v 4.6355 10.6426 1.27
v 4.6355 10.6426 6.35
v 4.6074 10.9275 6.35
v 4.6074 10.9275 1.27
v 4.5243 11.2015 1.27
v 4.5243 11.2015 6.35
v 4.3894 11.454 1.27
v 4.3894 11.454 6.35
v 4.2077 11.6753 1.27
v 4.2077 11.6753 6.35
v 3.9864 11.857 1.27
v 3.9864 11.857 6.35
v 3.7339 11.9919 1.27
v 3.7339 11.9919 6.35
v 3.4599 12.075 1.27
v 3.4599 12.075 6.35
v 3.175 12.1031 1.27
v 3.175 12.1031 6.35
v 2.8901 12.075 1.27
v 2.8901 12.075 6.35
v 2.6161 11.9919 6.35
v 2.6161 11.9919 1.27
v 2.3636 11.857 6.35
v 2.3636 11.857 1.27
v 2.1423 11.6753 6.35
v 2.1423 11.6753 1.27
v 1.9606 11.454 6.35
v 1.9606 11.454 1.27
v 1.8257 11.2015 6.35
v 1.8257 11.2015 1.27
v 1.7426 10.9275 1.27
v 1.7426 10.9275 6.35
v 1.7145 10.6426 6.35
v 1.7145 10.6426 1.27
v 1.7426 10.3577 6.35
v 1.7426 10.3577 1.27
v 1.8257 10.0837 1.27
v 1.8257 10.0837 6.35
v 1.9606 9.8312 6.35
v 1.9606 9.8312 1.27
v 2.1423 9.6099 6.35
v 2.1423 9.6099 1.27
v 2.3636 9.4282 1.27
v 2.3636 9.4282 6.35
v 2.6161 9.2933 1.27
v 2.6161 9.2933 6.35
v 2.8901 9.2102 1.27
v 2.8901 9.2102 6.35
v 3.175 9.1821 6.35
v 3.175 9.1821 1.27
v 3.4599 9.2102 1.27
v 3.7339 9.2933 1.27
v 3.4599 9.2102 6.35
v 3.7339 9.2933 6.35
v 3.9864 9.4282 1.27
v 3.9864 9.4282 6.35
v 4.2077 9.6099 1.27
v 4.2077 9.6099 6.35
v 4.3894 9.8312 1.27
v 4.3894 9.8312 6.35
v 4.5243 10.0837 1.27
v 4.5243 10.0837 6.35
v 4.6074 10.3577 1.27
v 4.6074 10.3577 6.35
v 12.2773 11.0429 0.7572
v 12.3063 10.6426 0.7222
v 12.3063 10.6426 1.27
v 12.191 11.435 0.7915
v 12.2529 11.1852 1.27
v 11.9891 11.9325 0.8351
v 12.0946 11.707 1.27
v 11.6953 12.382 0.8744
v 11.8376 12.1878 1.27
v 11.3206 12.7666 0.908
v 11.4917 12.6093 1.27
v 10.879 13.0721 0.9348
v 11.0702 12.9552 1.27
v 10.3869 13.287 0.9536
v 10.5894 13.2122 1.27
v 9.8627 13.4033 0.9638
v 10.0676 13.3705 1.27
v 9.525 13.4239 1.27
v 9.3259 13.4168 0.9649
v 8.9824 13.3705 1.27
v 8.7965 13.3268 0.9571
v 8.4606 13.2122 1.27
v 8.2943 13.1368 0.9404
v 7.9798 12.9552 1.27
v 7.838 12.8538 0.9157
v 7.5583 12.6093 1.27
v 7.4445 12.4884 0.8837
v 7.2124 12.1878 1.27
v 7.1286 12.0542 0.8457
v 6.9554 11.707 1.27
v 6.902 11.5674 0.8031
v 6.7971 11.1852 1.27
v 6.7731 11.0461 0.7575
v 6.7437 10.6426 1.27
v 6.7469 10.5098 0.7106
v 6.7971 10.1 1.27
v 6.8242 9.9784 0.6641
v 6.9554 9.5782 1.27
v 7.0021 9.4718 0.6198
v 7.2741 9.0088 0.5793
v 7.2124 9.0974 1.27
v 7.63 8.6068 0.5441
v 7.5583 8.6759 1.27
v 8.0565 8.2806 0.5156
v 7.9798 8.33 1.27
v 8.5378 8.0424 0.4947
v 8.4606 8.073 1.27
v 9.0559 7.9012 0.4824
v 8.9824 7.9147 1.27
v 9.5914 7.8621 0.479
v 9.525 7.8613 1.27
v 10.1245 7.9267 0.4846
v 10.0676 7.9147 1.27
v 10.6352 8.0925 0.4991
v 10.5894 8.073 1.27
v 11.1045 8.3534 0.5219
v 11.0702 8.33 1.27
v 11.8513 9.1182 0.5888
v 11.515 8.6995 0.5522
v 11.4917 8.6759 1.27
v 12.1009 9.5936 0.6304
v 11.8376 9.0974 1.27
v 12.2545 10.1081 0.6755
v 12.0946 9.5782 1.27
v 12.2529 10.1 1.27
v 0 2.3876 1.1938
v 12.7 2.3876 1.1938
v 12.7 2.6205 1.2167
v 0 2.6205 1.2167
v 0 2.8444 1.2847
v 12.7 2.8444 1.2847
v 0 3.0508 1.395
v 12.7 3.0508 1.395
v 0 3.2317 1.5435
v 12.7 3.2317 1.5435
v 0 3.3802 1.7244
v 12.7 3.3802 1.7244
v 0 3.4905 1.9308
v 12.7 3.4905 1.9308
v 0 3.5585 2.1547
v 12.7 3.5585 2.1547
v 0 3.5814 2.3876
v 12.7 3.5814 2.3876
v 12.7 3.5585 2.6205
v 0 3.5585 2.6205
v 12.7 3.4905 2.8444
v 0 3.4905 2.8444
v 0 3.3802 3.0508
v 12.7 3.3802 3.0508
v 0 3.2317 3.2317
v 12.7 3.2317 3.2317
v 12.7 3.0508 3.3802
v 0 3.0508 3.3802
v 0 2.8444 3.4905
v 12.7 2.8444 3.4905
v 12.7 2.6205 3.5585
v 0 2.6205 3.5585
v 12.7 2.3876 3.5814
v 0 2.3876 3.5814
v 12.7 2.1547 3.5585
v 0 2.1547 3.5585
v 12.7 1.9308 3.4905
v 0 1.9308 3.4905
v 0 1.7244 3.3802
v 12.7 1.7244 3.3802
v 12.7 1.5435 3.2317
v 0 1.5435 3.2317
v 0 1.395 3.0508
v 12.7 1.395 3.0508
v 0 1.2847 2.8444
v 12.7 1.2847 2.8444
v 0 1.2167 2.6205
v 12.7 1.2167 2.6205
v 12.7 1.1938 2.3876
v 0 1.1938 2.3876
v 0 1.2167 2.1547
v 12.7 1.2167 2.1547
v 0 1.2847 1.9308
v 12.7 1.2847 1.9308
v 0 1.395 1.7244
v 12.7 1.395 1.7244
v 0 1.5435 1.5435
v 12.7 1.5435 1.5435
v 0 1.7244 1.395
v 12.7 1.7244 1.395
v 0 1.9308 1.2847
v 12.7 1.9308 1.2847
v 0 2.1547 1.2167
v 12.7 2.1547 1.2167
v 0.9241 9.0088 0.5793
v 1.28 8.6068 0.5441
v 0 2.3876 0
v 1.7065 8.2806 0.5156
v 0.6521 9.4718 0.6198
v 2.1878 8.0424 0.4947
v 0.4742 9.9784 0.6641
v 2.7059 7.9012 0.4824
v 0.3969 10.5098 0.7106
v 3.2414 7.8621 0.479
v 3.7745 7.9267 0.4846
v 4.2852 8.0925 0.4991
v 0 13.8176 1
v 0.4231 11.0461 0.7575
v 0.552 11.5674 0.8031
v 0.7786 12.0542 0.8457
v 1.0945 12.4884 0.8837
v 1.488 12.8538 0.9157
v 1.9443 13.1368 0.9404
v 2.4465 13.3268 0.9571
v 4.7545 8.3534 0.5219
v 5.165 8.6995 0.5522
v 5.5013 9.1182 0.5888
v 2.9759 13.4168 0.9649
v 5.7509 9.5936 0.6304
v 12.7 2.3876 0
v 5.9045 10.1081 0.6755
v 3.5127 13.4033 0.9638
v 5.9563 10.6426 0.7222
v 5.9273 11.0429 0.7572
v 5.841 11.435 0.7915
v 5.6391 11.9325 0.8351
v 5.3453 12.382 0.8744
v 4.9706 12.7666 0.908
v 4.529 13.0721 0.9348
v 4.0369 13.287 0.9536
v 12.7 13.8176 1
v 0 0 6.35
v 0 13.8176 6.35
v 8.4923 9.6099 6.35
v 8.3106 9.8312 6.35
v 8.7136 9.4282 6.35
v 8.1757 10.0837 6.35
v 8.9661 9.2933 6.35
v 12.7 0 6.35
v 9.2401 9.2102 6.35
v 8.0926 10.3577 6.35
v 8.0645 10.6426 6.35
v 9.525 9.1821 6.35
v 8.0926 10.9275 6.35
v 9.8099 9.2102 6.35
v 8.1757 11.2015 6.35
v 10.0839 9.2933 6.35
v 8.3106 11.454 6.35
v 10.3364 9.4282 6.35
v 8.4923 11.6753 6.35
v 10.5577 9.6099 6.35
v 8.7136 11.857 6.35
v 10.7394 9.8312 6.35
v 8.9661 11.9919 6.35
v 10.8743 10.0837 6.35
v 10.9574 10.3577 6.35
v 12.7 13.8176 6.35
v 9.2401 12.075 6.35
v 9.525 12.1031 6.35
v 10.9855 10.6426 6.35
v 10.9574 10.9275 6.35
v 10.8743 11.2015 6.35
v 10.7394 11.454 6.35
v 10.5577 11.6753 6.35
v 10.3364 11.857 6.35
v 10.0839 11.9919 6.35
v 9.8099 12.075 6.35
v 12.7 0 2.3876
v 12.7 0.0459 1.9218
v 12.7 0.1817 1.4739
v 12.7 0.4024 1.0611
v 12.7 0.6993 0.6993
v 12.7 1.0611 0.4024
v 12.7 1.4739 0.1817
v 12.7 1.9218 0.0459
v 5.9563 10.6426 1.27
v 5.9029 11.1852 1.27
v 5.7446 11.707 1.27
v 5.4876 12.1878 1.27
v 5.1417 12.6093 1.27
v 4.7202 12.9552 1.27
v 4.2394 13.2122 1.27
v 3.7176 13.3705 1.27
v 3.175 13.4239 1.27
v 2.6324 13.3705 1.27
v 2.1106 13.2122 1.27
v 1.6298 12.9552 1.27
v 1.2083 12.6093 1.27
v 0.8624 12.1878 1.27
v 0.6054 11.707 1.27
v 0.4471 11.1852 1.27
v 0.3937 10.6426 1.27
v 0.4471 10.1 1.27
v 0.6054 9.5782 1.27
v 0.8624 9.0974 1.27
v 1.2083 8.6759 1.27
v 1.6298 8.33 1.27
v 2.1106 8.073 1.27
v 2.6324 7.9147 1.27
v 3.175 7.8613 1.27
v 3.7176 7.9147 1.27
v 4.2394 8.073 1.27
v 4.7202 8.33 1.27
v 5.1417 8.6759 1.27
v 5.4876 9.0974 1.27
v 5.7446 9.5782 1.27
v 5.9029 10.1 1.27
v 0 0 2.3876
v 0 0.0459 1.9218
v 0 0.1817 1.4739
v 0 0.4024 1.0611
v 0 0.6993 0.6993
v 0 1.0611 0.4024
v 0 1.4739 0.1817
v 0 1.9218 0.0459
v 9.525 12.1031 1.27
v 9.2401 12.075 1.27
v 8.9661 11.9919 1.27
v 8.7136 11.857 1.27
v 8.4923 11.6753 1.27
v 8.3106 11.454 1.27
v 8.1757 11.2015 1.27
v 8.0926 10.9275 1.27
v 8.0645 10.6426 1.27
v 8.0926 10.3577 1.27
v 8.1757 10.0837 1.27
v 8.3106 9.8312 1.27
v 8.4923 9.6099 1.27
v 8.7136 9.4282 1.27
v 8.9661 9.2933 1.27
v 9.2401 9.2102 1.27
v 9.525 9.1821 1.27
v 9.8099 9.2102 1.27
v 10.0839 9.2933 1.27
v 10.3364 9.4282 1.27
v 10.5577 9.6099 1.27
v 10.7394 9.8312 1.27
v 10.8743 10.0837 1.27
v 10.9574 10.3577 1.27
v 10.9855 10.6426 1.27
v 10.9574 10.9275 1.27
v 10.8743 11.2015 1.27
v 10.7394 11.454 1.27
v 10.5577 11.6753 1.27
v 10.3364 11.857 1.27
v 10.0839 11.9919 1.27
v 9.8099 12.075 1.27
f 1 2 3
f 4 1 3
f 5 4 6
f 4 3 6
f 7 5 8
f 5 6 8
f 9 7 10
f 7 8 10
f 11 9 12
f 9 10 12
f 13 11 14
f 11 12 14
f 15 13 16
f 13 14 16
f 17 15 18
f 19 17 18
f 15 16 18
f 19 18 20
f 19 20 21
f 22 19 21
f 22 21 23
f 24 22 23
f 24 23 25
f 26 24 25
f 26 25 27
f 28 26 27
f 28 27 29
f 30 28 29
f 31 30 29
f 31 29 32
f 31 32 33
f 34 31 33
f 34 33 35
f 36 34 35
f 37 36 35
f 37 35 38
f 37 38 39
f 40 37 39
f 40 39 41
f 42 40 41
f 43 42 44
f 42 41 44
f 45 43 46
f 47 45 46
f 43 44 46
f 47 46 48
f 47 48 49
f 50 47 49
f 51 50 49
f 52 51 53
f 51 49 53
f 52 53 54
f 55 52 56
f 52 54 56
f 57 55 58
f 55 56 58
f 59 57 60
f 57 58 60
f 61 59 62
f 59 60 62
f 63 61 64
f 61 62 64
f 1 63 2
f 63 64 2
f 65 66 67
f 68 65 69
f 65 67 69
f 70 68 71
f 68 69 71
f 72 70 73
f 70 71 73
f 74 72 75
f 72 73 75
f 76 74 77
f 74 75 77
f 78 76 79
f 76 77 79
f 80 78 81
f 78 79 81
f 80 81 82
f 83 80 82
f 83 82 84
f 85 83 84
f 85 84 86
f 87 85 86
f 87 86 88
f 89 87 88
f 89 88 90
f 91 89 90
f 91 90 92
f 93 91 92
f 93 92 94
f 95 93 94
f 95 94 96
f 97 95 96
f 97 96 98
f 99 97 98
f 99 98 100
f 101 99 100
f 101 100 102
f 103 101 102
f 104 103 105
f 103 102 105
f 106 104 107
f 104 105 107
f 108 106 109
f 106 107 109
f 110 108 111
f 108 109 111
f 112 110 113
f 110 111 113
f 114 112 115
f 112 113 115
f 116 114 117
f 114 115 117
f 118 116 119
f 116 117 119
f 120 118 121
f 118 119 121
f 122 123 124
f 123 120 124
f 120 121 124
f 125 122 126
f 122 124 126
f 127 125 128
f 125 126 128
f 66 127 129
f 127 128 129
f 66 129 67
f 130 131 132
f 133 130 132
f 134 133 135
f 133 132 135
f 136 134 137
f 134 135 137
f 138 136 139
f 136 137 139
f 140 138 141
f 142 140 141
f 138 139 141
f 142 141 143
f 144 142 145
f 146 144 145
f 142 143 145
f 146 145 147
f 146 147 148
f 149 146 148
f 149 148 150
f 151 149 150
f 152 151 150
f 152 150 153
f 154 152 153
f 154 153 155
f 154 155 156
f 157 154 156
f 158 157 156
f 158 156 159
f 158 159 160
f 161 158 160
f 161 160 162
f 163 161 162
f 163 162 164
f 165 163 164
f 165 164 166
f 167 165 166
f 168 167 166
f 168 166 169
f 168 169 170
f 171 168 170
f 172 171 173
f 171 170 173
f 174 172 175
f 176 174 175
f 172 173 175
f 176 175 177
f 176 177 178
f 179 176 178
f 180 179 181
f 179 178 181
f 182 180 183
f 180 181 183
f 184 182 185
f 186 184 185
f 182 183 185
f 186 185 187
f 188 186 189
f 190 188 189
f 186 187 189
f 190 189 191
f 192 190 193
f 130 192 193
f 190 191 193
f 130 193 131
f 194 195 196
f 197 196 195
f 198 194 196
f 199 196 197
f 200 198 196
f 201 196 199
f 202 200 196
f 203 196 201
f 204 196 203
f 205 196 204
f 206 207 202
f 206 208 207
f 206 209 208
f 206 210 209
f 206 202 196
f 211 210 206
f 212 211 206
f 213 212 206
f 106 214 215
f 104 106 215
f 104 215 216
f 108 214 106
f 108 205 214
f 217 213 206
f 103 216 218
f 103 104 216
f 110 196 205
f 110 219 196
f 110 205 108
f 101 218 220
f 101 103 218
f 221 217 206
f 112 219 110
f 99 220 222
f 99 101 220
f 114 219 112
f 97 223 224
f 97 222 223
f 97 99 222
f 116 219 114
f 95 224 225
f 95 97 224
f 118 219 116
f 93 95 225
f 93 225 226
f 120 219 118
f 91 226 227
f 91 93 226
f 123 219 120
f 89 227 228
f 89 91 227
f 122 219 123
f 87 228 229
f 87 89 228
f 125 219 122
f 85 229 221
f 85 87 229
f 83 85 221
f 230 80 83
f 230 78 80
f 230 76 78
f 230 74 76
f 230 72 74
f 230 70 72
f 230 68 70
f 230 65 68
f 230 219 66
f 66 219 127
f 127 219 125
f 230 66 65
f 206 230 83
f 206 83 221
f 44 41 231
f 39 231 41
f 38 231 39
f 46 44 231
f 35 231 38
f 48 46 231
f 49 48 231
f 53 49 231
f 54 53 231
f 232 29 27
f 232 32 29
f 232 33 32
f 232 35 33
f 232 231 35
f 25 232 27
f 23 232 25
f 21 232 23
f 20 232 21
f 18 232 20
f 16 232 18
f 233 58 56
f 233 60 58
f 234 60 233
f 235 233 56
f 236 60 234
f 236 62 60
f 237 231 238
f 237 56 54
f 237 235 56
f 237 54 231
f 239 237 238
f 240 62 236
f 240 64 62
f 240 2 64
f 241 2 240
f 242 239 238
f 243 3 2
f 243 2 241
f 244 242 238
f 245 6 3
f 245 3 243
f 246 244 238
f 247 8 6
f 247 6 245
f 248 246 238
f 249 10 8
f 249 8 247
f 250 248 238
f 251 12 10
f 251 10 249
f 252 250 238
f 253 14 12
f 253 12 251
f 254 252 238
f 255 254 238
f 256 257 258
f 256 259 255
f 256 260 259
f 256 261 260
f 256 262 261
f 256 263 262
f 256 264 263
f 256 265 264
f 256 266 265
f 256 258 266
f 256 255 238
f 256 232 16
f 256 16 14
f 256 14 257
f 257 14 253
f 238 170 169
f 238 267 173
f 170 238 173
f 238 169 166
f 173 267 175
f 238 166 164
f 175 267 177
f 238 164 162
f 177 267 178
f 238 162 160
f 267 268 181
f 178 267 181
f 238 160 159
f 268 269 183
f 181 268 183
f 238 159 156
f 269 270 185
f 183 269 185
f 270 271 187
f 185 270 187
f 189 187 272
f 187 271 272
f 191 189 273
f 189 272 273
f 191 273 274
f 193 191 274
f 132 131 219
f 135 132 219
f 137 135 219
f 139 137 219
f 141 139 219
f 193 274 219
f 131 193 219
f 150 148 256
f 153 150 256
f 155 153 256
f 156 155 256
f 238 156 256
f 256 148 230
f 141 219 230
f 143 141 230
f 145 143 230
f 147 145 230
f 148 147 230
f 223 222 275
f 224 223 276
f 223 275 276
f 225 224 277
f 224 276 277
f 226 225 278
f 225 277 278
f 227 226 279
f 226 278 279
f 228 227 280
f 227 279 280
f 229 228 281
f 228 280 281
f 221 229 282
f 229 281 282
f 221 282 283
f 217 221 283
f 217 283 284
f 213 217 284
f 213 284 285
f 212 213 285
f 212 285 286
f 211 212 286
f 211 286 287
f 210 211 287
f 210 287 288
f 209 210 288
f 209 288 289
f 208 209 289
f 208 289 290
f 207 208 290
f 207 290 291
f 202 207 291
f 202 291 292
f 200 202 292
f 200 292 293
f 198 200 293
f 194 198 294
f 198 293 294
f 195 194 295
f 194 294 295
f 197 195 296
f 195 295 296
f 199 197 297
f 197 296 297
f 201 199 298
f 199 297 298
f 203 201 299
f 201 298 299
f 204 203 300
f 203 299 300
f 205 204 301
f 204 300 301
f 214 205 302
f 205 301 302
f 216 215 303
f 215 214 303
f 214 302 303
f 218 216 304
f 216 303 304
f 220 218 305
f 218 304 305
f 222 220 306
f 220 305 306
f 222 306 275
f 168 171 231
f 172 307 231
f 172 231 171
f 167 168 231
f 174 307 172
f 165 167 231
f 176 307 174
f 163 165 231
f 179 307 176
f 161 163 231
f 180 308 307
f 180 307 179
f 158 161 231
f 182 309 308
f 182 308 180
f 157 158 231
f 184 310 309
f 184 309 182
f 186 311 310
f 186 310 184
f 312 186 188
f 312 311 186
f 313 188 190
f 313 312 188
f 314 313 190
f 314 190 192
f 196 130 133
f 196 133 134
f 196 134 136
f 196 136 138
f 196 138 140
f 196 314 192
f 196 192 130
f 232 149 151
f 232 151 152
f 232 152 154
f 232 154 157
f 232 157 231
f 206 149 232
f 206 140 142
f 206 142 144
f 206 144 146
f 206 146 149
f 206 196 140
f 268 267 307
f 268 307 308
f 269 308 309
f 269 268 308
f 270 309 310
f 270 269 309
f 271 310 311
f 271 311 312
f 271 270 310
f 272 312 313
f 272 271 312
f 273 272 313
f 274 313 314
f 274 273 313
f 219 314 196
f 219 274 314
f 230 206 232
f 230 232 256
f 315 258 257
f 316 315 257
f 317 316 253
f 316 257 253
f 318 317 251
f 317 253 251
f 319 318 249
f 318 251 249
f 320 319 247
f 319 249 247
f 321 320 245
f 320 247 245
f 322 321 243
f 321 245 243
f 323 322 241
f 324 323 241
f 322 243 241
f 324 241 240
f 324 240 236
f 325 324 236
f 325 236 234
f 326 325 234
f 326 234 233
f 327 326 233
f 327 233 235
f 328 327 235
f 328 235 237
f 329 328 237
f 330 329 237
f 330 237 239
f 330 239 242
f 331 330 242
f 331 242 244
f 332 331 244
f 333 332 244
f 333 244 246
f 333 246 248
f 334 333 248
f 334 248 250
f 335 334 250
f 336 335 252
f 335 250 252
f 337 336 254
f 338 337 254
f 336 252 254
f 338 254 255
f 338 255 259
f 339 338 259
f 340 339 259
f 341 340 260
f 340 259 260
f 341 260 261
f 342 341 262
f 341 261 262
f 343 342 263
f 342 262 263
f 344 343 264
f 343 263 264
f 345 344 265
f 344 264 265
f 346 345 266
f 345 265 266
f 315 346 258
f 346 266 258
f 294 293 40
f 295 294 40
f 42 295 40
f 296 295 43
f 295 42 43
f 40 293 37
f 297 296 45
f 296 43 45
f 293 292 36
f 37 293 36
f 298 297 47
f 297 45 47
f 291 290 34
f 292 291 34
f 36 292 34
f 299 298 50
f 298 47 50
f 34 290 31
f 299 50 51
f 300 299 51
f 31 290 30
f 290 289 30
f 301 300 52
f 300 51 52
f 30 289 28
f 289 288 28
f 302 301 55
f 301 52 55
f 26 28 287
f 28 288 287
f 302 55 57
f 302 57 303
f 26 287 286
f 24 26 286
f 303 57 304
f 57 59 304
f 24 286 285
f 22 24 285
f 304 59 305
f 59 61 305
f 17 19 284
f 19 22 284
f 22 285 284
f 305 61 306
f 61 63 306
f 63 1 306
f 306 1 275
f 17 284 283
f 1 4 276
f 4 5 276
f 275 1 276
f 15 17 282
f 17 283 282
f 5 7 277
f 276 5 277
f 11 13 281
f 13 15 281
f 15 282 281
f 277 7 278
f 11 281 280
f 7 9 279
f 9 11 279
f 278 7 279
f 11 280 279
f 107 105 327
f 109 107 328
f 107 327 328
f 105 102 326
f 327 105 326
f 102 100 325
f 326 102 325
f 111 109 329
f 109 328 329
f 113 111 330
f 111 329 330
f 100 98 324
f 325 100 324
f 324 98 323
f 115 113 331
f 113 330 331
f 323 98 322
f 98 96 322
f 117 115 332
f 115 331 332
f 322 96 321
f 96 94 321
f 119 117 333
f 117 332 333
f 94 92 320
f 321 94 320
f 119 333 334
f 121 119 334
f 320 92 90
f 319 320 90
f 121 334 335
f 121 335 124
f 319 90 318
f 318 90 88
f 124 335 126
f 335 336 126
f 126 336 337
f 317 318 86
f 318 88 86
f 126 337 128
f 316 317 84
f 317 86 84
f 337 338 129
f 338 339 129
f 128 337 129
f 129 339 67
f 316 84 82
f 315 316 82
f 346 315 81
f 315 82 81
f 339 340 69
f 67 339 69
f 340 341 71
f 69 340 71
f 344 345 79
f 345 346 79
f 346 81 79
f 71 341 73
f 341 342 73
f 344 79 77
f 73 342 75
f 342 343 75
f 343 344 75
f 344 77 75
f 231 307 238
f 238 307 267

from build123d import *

# Parameters (mm, degrees)
SKETCH2_W           = 12.7
SKETCH2_H           = 13.8176
BOSS_EXTRUDE1_DEPTH = 6.35
SKETCH4_R           = 1.1938
CUT_EXTRUDE1_DEPTH  = 20.812586145
CUT_EXTRUDE2_DEPTH  = 20.812586145
SKETCH8_R           = 1.4605
CUT_EXTRUDE3_DEPTH  = 20.812586145
SKETCH9_R           = 2.7813
CUT_EXTRUDE4_DEPTH  = 20.442799947


with BuildPart() as part:
    # Sketch2 → Boss-Extrude1 (new body)
    with BuildSketch(Plane.XY):
        with Locations((6.35, 6.9088)):
            Rectangle(SKETCH2_W, SKETCH2_H)
    extrude(amount=BOSS_EXTRUDE1_DEPTH)

    # Sketch4 → Cut-Extrude1 (cut, through all)
    with BuildSketch(Plane(origin=(12.7, 0, 0), x_dir=(0, 0, -1), z_dir=(1, 0, 0))):
        with Locations((-2.3876, 2.3876)):
            Circle(SKETCH4_R)
        with BuildLine():
            Line((0, 2.3876), (2.839420075, 2.3876))
            Line((2.839420075, 2.3876), (2.839420075, -2.482839526))
            Line((2.839420075, -2.482839526), (-2.3876, -2.482839526))
            Line((-2.3876, -2.482839526), (-2.3876, 0))
            ThreePointArc((-2.3876, 0), (-0.699311849, 0.699311849), (0, 2.3876))
        make_face()
    extrude(amount=-CUT_EXTRUDE1_DEPTH, mode=Mode.SUBTRACT)

    # Sketch7 → Cut-Extrude2 (cut, through all)
    with BuildSketch(Plane(origin=(12.7, 0, 0), x_dir=(0, 0, -1), z_dir=(1, 0, 0))):
        Polygon((0, 2.3876), (-1.031425935, 14.176852388), (1.156682431, 14.176852388), (1.156682431, 2.3876), align=None)
    extrude(amount=-CUT_EXTRUDE2_DEPTH, mode=Mode.SUBTRACT)

    # Sketch8 → Cut-Extrude3 (cut, through all)
    with BuildSketch(Plane.XY.offset(6.35)):
        with Locations((3.175, 10.6426)):
            Circle(SKETCH8_R)
        with Locations(Location((9.525, 10.6426, 0), (0, 0, 90))):
            Circle(SKETCH8_R)
    extrude(amount=-CUT_EXTRUDE3_DEPTH, mode=Mode.SUBTRACT)

    # Sketch9 → Cut-Extrude4 (cut, through all)
    with BuildSketch(Plane.XY.offset(1.27)):
        with Locations((3.175, 10.6426)):
            Circle(SKETCH9_R)
        with Locations((9.525, 10.6426)):
            Circle(SKETCH9_R)
    extrude(amount=-CUT_EXTRUDE4_DEPTH, mode=Mode.SUBTRACT)


solid = part.part
